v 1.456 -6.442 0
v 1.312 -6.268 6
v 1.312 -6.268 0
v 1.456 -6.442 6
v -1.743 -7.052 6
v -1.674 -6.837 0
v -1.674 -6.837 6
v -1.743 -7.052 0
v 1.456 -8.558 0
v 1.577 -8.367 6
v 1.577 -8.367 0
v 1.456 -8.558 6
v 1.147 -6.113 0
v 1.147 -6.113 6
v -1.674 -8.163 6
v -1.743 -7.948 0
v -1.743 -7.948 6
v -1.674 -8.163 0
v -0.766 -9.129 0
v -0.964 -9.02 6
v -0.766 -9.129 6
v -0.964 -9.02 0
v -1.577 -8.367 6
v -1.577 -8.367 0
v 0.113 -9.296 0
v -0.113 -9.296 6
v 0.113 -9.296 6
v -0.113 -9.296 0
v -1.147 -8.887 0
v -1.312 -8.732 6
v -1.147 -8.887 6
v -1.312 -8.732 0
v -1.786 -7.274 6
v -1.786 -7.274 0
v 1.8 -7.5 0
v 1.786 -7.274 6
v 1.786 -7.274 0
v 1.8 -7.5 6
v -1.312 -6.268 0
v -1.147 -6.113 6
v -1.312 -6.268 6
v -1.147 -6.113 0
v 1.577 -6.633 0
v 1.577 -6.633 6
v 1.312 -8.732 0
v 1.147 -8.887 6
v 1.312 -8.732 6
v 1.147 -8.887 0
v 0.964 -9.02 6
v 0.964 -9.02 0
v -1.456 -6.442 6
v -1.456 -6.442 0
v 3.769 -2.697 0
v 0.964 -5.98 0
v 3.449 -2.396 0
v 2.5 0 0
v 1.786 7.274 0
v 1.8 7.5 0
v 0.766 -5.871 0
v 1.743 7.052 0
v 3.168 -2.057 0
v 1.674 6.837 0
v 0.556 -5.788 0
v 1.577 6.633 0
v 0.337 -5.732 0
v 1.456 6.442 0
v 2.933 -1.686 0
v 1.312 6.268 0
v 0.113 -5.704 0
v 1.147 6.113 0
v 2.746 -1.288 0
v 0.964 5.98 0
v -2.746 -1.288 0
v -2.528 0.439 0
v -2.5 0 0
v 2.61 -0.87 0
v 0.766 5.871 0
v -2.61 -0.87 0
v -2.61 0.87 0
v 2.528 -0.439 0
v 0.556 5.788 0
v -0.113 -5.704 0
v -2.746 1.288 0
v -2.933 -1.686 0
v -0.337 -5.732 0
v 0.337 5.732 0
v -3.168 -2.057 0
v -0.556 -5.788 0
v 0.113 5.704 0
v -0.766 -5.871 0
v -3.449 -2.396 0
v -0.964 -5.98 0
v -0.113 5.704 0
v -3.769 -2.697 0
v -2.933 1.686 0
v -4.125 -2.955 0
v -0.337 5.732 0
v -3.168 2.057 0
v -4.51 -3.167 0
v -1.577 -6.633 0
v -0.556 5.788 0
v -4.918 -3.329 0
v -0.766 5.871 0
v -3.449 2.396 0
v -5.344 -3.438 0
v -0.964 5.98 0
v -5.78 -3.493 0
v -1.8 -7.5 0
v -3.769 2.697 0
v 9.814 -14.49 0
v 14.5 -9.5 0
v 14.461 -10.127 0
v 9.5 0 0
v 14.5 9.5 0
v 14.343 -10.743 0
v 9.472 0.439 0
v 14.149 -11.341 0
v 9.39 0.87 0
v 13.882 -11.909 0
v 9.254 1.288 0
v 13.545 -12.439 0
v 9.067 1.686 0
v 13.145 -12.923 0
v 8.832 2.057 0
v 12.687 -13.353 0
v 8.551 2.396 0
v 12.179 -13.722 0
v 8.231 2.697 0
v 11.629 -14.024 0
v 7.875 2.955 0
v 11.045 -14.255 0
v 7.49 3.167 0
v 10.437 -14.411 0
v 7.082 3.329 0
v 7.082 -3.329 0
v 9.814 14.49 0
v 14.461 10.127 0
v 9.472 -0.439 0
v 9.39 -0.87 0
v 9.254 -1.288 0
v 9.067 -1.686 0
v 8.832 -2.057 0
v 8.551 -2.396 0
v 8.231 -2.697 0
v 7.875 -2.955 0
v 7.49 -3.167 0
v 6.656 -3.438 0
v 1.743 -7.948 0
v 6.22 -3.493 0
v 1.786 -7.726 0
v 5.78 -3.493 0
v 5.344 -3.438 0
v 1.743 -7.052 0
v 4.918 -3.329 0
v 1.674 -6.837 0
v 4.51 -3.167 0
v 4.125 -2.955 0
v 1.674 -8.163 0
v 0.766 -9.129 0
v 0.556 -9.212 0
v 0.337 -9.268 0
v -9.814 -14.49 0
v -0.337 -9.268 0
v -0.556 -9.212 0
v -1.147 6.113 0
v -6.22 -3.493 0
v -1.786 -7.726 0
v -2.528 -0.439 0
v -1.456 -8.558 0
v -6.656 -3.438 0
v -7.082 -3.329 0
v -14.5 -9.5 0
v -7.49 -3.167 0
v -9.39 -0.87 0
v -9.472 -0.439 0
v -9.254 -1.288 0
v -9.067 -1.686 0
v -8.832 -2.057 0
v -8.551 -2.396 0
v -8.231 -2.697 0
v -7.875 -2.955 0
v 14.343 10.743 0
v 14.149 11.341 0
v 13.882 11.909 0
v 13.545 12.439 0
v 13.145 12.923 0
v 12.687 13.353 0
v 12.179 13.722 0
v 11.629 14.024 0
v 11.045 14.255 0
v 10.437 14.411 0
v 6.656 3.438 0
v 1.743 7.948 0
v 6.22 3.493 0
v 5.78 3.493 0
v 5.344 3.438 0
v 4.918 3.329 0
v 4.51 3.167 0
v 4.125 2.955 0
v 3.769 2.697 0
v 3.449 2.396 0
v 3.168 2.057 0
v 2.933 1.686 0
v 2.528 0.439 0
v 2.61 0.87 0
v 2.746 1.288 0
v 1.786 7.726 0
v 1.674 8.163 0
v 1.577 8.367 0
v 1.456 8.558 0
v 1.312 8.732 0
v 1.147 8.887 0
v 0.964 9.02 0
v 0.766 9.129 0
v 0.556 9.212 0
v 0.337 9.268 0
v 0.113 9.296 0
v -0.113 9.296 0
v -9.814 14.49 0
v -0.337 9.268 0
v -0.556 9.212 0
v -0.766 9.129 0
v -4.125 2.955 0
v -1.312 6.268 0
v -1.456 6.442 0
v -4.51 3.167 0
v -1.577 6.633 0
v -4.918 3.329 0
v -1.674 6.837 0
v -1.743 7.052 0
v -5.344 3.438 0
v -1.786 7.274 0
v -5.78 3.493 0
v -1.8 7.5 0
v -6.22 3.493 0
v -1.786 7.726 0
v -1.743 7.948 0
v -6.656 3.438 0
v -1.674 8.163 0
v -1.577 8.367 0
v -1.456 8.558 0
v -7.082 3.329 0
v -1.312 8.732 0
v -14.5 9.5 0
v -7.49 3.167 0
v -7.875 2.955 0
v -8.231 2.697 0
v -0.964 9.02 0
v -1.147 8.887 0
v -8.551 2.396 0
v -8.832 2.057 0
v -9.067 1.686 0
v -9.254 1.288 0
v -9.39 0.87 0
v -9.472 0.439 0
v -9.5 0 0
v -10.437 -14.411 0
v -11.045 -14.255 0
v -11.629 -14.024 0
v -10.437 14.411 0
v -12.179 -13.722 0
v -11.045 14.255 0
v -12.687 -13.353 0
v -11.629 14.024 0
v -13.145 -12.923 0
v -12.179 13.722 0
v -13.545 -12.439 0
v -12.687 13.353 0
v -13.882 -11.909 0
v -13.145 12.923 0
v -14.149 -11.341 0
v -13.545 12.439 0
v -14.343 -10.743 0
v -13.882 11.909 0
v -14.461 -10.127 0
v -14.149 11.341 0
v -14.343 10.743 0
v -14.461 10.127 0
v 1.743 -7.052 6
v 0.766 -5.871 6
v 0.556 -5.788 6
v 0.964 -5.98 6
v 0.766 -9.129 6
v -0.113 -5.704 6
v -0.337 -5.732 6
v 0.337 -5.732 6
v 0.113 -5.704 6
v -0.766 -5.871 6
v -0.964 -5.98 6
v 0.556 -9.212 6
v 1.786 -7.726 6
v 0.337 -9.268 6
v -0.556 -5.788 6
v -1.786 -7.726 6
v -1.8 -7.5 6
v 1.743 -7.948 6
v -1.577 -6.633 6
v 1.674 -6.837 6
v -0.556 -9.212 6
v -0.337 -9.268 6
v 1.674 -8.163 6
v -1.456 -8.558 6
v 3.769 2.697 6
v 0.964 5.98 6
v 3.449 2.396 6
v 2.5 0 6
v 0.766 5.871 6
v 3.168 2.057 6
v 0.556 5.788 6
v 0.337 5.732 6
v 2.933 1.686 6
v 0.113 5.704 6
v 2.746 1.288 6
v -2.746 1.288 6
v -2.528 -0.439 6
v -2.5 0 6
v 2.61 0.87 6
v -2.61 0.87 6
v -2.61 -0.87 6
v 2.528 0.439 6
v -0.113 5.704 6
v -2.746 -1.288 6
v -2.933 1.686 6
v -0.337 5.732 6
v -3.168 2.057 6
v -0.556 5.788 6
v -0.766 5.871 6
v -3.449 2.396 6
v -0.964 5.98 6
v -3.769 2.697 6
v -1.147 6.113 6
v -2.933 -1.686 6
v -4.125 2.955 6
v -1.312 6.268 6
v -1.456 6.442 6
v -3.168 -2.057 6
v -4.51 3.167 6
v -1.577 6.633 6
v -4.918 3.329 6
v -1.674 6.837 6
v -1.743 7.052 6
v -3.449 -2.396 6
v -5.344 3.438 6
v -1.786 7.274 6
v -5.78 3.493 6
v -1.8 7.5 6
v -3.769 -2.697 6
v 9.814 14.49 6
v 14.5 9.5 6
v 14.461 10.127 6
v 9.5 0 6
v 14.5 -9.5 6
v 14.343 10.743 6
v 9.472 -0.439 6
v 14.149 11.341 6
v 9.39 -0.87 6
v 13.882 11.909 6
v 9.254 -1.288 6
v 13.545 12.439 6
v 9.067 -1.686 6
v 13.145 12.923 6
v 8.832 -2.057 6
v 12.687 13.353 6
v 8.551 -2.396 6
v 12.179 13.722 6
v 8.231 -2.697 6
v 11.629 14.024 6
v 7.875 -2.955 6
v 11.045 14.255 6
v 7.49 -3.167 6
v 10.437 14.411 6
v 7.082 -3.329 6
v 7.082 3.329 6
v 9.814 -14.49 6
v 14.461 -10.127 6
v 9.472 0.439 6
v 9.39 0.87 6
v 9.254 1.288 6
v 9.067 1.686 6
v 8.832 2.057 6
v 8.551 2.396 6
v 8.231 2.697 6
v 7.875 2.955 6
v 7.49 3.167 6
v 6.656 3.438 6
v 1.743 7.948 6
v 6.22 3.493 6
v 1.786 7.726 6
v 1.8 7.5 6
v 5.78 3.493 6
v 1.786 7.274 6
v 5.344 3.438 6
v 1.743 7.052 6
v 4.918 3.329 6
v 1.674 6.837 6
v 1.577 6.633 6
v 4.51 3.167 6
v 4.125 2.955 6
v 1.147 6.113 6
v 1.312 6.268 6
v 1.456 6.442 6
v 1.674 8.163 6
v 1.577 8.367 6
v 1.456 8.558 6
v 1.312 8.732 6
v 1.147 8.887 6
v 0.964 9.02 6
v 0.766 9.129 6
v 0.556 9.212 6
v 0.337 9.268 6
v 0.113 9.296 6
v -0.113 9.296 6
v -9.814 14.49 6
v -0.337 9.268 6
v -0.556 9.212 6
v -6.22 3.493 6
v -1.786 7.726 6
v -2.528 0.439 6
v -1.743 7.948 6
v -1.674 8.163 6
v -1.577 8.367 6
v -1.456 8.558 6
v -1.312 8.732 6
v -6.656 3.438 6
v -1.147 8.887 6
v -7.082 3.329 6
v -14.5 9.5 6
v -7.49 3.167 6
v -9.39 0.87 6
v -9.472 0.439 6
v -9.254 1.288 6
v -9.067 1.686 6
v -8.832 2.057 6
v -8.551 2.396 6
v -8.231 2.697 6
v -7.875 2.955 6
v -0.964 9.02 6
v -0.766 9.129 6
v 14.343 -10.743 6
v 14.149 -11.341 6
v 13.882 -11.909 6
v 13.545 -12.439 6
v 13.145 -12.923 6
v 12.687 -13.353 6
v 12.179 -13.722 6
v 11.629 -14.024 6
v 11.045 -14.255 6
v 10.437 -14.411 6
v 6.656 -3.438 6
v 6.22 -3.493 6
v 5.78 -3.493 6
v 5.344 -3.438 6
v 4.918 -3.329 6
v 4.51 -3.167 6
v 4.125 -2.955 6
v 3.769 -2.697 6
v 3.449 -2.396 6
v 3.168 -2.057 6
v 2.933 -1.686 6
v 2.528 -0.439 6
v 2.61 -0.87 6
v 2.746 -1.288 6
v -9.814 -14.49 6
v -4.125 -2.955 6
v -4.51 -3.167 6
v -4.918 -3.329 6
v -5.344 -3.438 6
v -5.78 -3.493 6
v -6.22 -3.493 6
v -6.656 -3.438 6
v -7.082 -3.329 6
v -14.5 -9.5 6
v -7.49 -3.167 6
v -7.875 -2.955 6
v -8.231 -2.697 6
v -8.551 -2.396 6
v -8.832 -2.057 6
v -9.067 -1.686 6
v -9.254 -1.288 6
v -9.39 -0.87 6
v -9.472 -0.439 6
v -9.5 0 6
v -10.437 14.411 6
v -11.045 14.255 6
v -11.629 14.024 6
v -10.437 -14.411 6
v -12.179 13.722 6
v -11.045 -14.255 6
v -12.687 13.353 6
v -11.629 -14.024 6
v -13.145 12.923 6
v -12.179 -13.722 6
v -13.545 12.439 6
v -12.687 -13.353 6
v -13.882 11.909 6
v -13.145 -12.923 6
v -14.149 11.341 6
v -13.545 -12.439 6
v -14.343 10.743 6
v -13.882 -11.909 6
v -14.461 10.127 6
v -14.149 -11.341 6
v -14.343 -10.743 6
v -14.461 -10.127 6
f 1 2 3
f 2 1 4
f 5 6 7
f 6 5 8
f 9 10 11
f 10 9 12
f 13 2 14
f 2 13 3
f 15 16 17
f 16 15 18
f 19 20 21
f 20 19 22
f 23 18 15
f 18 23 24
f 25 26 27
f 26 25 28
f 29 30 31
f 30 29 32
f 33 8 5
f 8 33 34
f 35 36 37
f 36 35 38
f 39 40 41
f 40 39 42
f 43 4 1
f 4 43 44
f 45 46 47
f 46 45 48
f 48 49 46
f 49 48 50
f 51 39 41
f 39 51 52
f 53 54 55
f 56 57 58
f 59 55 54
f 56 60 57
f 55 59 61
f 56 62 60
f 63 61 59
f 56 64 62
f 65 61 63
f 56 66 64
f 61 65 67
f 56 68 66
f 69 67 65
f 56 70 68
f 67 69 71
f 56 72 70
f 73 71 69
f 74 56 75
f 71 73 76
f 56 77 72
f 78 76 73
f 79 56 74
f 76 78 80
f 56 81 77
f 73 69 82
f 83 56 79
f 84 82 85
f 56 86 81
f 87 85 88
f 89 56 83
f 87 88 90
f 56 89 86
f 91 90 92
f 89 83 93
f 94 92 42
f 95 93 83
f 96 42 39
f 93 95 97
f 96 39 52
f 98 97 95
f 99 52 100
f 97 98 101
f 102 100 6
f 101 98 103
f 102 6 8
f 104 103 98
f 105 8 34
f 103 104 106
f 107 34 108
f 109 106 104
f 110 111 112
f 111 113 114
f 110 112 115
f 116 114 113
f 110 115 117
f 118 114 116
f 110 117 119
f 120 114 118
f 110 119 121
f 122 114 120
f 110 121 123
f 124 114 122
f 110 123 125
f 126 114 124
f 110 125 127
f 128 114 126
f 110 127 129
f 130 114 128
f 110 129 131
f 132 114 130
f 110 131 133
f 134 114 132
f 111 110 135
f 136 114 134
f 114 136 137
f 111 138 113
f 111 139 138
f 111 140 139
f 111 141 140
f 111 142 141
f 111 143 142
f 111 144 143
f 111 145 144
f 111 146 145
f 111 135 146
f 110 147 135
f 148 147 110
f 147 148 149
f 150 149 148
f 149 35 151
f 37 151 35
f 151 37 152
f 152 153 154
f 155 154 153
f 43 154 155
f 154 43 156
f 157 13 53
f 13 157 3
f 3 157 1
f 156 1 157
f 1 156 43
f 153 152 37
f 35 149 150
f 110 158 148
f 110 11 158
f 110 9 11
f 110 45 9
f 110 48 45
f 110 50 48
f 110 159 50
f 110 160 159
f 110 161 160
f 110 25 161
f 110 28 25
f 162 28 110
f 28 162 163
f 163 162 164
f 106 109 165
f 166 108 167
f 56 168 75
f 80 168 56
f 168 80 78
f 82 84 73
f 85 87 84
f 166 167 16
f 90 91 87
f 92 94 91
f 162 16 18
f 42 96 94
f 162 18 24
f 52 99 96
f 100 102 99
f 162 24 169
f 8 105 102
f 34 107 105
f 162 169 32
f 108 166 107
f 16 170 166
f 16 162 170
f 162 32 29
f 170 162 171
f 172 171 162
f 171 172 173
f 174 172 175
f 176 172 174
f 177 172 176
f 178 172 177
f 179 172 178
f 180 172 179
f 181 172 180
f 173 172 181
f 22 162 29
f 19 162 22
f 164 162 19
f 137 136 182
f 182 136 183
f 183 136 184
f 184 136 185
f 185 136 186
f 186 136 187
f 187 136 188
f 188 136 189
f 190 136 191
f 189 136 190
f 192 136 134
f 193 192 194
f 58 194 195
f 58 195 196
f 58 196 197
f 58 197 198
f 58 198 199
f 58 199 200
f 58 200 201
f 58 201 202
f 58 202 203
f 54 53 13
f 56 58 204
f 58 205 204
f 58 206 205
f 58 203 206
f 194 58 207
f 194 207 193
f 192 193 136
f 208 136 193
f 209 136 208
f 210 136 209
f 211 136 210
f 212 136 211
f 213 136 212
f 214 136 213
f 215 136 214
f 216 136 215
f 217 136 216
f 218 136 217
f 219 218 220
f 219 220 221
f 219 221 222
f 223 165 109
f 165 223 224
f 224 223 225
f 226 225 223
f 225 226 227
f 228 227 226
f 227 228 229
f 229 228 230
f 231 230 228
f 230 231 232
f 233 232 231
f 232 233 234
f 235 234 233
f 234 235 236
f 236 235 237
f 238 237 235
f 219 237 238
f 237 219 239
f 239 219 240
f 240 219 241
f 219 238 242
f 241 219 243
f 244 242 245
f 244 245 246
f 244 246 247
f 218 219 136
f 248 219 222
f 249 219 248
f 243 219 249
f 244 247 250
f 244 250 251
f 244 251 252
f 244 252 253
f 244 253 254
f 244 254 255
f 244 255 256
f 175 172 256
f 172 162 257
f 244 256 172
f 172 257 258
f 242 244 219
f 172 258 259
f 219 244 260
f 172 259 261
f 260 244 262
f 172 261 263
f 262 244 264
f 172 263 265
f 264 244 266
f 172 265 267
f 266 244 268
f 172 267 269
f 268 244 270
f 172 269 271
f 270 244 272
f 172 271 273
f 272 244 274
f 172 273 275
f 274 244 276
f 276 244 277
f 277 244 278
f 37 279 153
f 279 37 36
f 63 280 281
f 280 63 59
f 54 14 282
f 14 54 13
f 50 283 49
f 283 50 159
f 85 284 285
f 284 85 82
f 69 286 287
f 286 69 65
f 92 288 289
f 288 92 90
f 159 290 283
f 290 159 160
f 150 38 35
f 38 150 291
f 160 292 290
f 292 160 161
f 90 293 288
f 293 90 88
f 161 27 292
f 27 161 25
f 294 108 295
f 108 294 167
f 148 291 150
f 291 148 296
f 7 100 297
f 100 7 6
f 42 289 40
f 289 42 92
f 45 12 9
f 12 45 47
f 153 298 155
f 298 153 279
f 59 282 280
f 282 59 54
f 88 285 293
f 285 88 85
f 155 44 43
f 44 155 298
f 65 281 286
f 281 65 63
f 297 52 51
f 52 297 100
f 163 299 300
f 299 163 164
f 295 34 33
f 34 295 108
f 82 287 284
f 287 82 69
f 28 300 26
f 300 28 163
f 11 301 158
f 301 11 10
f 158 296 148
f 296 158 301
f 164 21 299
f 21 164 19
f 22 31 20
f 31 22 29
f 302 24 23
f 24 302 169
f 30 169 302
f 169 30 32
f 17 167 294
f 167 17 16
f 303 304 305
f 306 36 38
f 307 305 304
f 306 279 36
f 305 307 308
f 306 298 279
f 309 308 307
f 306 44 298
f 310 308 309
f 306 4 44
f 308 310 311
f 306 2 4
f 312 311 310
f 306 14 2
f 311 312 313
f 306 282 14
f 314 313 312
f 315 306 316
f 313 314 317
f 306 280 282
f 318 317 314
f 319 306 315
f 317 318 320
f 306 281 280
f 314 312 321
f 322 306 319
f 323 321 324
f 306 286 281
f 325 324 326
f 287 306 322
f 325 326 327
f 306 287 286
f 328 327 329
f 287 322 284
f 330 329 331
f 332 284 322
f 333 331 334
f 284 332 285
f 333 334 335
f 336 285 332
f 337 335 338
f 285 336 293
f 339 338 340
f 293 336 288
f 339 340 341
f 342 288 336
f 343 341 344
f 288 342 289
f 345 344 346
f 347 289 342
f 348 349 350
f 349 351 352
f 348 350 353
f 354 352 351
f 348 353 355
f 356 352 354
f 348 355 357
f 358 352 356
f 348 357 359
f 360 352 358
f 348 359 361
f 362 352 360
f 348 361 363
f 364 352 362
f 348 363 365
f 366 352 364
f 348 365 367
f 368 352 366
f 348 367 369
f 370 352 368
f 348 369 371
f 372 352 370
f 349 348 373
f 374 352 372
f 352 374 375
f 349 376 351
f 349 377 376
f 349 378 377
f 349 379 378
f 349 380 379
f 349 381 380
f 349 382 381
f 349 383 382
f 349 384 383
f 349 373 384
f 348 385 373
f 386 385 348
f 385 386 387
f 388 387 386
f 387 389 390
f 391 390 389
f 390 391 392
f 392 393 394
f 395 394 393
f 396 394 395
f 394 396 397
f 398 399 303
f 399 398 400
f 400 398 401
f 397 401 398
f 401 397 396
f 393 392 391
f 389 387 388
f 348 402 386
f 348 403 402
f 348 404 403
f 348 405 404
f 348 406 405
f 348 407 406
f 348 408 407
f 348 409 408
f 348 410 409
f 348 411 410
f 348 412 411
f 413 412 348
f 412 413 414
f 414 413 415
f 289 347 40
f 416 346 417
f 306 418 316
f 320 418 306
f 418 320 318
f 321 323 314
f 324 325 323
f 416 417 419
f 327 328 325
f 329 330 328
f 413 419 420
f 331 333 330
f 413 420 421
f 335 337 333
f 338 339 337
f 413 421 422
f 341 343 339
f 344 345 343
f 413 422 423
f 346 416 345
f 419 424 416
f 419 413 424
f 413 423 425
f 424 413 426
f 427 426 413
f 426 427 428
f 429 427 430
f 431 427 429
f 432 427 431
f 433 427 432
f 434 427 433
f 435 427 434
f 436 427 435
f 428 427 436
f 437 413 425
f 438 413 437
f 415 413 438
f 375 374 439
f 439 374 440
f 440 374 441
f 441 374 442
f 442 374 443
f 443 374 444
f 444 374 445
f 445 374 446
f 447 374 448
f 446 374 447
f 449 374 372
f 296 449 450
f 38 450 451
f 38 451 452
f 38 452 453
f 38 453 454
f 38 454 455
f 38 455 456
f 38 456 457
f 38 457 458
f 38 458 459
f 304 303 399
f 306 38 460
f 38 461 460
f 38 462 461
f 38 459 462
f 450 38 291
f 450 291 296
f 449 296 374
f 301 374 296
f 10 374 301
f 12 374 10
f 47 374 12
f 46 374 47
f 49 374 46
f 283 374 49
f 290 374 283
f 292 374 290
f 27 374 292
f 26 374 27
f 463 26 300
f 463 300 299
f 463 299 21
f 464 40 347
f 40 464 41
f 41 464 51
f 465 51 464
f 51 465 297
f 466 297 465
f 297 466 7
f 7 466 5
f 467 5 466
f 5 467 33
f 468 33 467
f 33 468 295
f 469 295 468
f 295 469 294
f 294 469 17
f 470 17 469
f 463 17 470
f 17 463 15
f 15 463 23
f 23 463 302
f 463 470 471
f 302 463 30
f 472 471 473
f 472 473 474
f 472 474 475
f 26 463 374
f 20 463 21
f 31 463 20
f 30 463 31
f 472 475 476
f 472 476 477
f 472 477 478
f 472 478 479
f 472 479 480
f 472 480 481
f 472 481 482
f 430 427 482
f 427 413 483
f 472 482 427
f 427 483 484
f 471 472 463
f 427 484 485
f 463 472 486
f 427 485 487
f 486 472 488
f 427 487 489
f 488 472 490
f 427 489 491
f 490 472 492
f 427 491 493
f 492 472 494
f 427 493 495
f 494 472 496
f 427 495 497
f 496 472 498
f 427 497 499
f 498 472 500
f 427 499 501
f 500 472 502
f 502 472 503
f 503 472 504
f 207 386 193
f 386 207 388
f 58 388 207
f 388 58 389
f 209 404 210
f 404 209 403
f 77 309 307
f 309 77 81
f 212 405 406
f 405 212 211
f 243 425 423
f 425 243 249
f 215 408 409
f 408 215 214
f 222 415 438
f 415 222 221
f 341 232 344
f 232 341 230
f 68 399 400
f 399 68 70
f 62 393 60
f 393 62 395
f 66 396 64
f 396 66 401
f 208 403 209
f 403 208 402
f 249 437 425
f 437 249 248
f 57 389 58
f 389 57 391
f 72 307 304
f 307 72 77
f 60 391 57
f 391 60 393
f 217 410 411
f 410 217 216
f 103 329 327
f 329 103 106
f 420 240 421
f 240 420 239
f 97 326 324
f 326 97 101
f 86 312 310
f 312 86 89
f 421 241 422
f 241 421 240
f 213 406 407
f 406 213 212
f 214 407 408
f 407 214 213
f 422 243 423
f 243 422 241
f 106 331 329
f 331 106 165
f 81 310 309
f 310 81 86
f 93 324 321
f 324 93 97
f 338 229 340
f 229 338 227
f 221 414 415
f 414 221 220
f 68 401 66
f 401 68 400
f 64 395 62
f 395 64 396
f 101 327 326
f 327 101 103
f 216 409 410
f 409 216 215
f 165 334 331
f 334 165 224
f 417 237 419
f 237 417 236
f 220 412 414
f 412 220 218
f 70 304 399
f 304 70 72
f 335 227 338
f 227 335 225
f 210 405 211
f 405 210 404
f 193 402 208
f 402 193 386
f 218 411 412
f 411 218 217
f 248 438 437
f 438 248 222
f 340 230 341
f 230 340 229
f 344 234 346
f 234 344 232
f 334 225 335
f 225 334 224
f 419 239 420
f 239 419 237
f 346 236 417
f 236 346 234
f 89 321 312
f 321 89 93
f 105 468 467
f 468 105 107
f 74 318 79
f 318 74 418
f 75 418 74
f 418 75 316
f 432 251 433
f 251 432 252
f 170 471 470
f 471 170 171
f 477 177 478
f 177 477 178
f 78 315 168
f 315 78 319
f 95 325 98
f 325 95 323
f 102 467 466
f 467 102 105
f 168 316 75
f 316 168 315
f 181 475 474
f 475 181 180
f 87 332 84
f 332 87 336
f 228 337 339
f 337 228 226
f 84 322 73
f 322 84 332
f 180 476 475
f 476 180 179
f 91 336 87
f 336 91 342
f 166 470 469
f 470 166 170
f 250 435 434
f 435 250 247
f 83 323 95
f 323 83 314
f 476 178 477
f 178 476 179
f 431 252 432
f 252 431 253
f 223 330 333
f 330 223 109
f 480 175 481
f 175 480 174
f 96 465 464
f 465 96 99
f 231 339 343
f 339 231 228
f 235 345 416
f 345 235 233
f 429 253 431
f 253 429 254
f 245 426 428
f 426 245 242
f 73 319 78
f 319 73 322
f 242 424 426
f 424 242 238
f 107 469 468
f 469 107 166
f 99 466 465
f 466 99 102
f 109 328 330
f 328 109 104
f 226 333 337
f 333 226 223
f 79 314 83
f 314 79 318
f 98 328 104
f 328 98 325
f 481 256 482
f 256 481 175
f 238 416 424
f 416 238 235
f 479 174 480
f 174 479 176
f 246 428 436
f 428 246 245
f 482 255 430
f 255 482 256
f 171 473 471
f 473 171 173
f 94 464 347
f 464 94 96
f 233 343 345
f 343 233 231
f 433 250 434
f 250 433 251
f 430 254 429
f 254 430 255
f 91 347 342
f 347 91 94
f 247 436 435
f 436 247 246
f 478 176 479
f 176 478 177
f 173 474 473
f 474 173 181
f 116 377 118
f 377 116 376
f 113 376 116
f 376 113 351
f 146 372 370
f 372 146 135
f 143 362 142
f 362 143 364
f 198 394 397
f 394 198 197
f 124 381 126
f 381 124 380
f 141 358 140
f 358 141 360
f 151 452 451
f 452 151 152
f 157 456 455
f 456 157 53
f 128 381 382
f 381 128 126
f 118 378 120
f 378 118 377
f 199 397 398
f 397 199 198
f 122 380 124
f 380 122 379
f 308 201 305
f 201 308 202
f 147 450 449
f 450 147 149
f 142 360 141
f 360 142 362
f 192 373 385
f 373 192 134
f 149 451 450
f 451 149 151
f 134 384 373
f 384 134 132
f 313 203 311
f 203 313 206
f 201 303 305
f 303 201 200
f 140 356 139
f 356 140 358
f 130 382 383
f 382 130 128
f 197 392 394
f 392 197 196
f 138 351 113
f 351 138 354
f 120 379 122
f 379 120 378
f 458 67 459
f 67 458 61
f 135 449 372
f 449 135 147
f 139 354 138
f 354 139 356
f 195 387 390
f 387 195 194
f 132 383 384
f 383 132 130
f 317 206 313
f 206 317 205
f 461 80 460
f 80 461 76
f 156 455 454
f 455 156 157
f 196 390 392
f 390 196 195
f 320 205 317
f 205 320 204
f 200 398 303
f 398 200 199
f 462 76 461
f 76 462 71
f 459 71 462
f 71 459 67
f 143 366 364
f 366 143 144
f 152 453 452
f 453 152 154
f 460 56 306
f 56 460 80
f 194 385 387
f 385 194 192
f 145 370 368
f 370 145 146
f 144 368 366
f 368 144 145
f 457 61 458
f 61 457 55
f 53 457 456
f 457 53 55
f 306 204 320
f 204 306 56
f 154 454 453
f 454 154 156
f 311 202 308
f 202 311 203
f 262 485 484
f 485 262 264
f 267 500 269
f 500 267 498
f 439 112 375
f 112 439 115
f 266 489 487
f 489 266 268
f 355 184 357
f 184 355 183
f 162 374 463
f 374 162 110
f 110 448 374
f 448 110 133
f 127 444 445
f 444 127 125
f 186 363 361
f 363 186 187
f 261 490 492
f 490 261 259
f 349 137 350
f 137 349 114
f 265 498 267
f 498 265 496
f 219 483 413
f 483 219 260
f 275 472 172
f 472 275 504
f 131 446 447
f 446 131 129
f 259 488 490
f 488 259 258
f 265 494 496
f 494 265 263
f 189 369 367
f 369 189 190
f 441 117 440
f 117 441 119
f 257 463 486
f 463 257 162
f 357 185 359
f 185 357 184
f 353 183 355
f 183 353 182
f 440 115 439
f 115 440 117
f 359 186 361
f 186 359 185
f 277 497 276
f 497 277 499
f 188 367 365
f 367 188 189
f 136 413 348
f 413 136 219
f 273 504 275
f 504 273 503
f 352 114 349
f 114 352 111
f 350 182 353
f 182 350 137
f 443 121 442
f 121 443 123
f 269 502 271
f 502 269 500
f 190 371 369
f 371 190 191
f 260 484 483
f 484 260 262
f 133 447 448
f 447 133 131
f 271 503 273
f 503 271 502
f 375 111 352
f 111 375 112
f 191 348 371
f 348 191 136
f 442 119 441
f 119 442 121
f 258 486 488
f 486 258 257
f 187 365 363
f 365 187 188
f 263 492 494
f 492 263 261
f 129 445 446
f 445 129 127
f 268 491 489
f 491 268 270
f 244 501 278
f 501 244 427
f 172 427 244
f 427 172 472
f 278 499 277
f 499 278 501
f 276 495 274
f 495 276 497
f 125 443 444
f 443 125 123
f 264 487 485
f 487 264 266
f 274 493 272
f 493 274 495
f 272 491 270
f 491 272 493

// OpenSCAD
$fn = 50;

difference() {
	union() {
		hull() {
			translate(v = [-9.5, 9.5, 0]) {
				cylinder(h = 6, r = 5);
			}
			translate(v = [9.5, 9.5, 0]) {
				cylinder(h = 6, r = 5);
			}
			translate(v = [-9.5, -9.5, 0]) {
				cylinder(h = 6, r = 5);
			}
			translate(v = [9.5, -9.5, 0]) {
				cylinder(h = 6, r = 5);
			}
		}
	}
	union() {
		translate(v = [0.0, -7.5, 0]) {
			cylinder(h = 6, r = 1.8);
		}
		translate(v = [0.0, 7.5, 0]) {
			cylinder(h = 6, r = 1.8);
		}
		translate(v = [-6.0, 0, 0.0]) {
			cylinder(h = 6, r = 3.5);
		}
		translate(v = [6.0, 0, 0.0]) {
			cylinder(h = 6, r = 3.5);
		}
	}
}
